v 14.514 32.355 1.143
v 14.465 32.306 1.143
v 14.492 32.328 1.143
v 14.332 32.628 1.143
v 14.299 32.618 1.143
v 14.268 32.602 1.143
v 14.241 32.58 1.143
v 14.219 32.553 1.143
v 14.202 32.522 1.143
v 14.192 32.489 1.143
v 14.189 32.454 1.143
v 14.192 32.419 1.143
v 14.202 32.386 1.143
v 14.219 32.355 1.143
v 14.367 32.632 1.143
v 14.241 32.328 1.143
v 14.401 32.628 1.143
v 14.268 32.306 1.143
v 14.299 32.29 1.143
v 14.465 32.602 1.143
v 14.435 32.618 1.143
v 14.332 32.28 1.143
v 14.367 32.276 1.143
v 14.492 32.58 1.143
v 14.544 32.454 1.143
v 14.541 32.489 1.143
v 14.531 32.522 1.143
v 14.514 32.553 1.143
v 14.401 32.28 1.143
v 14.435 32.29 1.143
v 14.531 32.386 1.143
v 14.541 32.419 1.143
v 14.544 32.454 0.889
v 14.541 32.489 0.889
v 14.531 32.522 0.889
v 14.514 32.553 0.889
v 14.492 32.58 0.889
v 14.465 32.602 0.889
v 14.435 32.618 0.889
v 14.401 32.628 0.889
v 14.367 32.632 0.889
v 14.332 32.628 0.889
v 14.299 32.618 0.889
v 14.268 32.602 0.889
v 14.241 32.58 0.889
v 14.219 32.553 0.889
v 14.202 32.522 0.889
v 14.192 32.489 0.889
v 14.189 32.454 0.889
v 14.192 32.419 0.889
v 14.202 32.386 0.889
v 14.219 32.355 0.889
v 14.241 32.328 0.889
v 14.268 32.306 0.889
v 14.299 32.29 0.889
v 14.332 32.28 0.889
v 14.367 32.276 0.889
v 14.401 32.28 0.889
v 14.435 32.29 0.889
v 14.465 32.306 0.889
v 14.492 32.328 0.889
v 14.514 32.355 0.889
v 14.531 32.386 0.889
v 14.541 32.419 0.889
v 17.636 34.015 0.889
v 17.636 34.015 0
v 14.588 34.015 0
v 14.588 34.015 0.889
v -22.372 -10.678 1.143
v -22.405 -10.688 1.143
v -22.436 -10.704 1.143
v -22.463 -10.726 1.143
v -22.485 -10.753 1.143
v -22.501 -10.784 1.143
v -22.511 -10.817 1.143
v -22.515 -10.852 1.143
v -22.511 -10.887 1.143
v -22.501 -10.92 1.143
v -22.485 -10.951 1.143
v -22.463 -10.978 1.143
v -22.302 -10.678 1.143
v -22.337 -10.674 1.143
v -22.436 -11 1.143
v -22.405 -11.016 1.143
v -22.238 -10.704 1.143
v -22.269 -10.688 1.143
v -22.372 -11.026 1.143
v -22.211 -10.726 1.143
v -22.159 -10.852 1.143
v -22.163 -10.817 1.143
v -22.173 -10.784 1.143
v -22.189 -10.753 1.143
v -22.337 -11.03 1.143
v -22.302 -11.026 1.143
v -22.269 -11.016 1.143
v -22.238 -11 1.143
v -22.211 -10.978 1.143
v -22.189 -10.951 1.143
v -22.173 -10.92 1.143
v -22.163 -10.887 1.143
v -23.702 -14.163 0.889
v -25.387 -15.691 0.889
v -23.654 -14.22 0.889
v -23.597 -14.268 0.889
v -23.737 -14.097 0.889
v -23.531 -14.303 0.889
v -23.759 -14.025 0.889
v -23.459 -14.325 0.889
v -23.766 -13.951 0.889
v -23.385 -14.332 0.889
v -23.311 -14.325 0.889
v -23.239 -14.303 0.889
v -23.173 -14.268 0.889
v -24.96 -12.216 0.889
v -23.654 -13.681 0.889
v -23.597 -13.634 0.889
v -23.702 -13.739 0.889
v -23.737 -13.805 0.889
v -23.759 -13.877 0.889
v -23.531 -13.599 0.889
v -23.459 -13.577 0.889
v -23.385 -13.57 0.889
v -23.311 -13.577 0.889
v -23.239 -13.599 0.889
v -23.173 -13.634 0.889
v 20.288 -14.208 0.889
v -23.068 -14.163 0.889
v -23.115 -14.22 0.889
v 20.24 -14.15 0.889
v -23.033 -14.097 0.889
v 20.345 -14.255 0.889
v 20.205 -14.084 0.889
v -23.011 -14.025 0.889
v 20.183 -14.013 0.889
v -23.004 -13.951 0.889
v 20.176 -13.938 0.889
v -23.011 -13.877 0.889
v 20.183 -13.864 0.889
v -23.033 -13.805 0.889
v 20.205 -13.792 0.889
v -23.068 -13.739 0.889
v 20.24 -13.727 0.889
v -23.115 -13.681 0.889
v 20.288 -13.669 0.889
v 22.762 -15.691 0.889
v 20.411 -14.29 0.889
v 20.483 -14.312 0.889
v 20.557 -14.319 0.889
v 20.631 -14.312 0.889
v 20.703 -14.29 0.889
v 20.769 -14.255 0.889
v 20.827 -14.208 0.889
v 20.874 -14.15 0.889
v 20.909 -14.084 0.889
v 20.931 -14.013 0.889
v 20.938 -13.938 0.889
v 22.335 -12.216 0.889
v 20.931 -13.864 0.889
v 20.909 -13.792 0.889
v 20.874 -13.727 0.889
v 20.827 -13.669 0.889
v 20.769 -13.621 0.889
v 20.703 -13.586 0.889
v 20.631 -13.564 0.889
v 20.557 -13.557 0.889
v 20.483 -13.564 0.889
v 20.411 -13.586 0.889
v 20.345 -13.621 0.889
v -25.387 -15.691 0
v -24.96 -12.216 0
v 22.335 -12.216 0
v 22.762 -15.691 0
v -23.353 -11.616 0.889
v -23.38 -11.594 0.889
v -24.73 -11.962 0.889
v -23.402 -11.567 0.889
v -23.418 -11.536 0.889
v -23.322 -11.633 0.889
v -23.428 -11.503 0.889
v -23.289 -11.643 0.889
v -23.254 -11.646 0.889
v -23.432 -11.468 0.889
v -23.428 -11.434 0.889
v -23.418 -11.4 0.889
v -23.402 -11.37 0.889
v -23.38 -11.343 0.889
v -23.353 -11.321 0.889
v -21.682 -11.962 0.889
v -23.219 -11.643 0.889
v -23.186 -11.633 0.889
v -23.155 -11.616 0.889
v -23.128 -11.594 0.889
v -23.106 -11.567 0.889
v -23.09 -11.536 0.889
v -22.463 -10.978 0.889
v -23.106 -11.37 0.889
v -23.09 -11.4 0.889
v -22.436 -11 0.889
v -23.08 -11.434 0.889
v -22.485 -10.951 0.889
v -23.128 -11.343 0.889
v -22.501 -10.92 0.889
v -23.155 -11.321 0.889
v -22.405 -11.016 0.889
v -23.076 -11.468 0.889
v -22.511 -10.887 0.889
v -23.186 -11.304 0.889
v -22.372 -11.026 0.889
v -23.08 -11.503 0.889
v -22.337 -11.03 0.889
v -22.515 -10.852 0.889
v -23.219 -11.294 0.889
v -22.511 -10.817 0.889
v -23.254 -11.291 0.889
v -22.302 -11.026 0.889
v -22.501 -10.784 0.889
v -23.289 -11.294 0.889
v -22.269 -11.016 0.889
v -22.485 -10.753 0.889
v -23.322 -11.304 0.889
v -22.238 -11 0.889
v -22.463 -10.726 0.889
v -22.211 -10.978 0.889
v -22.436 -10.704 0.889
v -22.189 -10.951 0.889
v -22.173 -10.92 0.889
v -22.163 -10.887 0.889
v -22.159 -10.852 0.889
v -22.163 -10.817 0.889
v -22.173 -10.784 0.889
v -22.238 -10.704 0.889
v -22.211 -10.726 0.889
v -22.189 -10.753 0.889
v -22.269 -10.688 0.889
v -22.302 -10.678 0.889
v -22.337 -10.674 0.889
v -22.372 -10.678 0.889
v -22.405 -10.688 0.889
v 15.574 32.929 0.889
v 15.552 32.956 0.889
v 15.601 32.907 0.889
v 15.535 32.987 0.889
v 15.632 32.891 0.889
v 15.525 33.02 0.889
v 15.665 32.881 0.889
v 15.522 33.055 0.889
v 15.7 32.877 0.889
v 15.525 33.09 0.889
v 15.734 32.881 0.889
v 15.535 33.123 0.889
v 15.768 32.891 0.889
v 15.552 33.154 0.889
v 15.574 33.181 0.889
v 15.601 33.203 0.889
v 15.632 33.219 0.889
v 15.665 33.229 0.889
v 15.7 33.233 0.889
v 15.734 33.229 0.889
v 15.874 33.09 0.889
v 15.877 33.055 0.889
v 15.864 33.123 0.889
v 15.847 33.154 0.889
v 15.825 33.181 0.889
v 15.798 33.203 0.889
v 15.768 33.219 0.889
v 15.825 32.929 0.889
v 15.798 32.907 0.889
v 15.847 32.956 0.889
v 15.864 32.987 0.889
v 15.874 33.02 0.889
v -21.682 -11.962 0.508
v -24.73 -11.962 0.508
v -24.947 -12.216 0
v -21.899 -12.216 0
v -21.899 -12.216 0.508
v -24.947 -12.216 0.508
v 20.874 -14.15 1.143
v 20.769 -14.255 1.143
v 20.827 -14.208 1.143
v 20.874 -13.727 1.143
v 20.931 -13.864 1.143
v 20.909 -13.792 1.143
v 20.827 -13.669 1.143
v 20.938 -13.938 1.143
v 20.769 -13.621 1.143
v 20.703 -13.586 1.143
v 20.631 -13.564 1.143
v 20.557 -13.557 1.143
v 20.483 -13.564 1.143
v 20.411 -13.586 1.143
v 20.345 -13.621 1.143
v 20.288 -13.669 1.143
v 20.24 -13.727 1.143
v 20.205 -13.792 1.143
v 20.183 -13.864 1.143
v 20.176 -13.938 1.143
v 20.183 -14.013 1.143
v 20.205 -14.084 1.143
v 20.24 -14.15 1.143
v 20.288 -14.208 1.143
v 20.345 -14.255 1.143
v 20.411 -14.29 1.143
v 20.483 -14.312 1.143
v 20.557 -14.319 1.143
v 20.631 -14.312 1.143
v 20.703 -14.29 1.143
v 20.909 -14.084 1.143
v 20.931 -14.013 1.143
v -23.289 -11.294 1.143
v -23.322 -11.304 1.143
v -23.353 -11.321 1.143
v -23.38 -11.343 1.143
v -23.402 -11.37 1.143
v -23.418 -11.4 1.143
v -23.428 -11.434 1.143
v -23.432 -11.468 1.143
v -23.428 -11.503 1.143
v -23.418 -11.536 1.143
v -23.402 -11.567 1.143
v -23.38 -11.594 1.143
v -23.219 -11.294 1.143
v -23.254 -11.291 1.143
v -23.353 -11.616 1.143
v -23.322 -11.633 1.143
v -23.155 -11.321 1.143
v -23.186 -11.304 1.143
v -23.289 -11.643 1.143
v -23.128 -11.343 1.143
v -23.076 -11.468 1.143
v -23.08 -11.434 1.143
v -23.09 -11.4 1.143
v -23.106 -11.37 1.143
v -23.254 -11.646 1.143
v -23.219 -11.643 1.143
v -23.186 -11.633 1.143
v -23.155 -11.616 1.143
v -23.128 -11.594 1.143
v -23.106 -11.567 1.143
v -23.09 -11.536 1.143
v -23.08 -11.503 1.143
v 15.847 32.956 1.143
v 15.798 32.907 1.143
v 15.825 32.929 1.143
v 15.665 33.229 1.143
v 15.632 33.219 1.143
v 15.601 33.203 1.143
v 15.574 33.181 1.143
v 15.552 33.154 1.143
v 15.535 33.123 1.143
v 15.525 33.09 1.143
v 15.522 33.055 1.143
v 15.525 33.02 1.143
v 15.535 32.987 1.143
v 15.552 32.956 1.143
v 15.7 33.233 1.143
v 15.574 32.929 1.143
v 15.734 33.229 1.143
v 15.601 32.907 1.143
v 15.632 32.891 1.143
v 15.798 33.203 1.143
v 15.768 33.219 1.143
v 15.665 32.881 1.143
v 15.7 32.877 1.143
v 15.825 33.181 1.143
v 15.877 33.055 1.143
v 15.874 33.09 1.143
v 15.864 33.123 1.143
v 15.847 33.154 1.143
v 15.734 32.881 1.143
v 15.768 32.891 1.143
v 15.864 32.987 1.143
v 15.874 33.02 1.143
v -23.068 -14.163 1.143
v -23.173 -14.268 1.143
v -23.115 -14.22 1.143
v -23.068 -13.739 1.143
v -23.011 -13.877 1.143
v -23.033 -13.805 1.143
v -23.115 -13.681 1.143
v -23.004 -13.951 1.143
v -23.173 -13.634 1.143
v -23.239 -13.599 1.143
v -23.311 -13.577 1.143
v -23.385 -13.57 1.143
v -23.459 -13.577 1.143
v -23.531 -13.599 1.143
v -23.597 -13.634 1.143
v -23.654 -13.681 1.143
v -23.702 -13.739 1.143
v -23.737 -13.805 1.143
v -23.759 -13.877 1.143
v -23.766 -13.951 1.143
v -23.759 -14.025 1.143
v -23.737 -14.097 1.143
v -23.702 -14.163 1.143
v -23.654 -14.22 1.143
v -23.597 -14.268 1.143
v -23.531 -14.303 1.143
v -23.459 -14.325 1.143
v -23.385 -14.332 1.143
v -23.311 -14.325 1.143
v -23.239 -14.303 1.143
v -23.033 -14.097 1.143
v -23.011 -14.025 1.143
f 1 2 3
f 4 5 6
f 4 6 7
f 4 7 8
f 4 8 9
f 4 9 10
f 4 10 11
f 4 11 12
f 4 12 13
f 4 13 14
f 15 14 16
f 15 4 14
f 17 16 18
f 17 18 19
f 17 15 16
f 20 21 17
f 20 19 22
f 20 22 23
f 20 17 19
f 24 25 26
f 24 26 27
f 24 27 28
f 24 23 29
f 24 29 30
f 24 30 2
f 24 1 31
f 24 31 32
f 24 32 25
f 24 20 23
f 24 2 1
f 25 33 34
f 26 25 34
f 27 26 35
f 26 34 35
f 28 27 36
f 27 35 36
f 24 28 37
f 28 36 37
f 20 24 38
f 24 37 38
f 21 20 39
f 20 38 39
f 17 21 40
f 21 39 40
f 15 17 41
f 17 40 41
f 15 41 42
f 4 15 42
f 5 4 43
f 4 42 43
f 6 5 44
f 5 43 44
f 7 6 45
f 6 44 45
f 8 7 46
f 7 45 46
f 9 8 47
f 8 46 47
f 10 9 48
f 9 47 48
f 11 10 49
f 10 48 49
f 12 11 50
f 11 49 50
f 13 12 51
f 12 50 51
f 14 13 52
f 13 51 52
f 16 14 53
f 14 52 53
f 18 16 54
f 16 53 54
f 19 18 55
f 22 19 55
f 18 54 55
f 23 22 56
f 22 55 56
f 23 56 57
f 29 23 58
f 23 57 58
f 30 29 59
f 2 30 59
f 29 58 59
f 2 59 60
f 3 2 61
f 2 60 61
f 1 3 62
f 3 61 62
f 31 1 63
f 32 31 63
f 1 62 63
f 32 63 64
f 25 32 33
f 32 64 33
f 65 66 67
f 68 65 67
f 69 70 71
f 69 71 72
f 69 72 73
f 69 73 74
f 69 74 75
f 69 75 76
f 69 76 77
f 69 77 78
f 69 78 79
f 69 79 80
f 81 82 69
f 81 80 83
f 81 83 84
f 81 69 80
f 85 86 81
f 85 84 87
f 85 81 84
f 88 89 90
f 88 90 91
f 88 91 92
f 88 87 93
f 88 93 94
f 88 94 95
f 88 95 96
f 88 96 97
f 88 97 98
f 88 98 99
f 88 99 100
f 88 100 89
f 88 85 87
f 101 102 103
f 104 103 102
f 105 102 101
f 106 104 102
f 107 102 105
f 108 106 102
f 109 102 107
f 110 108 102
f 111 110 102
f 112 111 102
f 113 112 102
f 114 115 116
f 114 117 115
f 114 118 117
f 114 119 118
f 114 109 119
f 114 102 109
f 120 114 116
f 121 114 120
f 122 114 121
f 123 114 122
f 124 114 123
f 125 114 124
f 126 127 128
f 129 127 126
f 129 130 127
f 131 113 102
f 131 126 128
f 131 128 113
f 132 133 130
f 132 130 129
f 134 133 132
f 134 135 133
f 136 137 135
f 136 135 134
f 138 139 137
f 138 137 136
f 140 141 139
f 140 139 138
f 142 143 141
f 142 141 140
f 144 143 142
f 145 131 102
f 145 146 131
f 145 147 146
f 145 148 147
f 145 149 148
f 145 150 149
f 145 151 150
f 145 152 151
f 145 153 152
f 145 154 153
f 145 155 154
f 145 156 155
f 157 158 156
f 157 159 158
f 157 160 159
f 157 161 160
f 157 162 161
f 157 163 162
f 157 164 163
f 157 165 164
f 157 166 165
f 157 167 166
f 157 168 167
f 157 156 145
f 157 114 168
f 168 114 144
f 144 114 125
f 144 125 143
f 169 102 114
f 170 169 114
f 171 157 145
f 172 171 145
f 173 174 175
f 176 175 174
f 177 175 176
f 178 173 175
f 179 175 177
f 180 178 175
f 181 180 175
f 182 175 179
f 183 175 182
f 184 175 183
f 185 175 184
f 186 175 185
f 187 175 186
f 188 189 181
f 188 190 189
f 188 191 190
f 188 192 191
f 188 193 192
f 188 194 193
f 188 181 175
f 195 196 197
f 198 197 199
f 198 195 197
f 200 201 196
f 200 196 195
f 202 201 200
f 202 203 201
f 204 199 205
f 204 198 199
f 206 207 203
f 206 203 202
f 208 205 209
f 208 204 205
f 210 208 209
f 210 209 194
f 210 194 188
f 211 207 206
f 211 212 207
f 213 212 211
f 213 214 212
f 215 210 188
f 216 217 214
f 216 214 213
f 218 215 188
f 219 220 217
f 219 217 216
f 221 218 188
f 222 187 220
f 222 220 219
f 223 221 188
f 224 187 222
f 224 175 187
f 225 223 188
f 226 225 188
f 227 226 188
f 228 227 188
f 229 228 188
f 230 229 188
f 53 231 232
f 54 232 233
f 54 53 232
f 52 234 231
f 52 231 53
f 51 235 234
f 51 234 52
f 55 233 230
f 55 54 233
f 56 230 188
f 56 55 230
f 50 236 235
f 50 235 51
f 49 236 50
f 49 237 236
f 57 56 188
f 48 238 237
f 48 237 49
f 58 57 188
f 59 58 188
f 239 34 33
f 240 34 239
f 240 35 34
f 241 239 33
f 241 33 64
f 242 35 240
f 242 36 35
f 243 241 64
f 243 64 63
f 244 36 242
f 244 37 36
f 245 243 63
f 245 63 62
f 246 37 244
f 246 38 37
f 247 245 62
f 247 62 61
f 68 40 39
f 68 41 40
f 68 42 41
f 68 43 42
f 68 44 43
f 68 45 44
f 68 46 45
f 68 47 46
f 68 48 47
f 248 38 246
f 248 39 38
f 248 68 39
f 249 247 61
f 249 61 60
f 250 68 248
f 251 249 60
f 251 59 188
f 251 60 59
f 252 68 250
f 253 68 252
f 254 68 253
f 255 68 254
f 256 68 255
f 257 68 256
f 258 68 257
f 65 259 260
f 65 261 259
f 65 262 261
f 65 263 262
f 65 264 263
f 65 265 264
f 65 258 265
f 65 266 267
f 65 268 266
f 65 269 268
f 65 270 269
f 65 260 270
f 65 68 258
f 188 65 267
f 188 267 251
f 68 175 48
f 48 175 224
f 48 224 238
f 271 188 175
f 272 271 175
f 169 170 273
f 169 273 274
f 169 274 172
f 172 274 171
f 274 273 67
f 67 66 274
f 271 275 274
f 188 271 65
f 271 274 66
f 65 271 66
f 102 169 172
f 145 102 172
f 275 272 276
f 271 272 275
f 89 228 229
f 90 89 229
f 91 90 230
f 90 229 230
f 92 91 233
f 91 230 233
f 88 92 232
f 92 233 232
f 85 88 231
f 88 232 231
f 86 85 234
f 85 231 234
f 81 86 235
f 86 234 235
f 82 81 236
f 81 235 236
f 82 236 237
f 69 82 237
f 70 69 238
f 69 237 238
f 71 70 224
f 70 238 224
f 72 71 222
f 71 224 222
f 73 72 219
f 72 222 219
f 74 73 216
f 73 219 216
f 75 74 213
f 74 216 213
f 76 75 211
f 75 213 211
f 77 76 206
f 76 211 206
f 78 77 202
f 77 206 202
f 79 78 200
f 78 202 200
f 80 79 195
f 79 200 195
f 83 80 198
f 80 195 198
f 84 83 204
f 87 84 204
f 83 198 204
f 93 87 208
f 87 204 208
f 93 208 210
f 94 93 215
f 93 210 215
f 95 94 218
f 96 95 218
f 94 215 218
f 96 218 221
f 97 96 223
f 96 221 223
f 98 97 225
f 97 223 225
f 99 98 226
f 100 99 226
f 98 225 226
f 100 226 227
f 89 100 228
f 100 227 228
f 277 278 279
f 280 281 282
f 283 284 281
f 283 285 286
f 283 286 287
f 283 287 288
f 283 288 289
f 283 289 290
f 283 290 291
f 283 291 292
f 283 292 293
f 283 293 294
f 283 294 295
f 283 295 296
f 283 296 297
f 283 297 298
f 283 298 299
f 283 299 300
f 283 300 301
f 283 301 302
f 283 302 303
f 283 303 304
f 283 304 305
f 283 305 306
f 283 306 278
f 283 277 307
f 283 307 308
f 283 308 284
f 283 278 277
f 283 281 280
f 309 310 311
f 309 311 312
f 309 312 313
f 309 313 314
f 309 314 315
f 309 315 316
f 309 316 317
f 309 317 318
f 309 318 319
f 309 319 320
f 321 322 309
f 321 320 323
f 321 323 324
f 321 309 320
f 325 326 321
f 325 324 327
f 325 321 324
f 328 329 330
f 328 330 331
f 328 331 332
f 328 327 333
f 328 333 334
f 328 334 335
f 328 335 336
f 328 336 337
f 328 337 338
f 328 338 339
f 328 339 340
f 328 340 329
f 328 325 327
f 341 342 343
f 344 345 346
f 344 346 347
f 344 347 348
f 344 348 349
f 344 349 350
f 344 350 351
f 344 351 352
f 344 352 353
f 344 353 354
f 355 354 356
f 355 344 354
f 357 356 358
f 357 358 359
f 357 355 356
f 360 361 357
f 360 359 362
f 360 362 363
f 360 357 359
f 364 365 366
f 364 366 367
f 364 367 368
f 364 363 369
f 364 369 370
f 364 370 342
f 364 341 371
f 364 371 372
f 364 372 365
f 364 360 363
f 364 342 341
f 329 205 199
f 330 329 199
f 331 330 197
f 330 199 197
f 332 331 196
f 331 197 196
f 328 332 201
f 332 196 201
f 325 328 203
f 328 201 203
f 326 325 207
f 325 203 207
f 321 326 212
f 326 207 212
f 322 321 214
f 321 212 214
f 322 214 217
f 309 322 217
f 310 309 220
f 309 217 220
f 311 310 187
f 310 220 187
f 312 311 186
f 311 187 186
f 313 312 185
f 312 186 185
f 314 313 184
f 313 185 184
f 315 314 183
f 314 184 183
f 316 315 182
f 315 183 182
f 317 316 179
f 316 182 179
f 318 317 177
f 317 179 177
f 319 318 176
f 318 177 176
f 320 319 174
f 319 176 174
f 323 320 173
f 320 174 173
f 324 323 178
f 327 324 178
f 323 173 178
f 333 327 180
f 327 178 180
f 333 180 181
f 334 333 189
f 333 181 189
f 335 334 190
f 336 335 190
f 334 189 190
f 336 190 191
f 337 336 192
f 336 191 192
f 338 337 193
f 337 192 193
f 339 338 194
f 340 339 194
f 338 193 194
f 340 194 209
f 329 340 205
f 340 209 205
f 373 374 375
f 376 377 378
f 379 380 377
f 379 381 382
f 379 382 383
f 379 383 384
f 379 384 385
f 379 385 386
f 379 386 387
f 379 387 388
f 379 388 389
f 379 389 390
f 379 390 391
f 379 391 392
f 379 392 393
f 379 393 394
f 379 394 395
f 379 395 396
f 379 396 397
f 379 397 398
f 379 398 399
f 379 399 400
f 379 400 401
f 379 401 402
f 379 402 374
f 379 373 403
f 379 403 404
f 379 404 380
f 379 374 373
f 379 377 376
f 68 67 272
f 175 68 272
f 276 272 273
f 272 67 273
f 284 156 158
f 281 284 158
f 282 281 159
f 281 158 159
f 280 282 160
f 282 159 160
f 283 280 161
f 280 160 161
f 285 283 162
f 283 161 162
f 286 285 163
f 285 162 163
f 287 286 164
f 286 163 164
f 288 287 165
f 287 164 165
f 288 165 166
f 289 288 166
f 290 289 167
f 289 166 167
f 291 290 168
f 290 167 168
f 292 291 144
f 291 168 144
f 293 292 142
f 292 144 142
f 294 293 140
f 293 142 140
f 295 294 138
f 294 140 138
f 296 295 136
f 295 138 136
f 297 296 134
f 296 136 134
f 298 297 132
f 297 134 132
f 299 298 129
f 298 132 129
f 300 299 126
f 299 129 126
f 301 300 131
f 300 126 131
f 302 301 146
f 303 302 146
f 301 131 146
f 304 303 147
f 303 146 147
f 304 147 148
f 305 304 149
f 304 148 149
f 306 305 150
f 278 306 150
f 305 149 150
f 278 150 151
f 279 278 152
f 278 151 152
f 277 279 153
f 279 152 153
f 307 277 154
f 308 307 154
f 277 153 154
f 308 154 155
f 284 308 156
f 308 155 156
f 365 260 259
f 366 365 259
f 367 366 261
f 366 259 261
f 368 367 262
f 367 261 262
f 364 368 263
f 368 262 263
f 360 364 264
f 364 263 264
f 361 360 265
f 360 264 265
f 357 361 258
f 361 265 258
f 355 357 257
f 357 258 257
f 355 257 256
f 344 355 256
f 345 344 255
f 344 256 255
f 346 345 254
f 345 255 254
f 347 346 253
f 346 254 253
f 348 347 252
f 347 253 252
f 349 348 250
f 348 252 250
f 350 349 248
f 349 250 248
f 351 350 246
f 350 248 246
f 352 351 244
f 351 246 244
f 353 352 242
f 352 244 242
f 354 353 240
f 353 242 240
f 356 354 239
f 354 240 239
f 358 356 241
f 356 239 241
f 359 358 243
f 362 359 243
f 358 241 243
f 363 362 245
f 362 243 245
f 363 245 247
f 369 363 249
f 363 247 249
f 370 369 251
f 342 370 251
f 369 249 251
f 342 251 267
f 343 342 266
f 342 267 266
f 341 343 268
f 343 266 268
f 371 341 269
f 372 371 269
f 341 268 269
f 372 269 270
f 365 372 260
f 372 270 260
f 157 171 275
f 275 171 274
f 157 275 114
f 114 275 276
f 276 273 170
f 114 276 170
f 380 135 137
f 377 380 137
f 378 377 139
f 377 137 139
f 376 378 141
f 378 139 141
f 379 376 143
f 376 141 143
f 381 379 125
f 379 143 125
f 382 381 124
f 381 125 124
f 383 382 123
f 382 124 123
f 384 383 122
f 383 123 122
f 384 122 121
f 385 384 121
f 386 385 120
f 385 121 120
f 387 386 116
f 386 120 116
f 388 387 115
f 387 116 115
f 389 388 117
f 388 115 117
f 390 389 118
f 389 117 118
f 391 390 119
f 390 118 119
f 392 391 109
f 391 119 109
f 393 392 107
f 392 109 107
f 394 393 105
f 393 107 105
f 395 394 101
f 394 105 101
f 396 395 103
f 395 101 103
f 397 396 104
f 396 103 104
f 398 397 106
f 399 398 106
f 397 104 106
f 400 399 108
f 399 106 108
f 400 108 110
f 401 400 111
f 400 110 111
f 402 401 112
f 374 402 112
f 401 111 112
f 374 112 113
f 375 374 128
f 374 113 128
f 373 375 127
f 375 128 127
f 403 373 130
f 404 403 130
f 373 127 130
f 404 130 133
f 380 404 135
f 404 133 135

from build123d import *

# Parameters (mm, degrees)
F1_DEPTH = 0.889
F3_DEPTH = 0.381
F4_R     = 0.1778
F4_R_2   = 0.381
F5_DEPTH = 0.254
F7_DEPTH = 25.4


with BuildPart() as f1:
    # F0 (on Top) → F1 (new body)
    with BuildSketch(Plane.XY):
        Polygon((-24.947381, -12.216053), (-26.81388, -12.216053), (-26.81388, -15.690773), (23.98612, -15.690773), (23.98612, -12.216053), (-21.899363, -12.216053), (17.63612, 34.014853), (14.588101, 34.014853), align=None)
    extrude(amount=F1_DEPTH)

    # F2 (on face) → F3 (cut)
    with BuildSketch(Plane.XY.offset(0.889)):
        Polygon((-24.730167, -11.962053), (-24.947381, -12.216053), (-21.899363, -12.216053), (-21.682148, -11.962053), align=None)
    extrude(amount=-F3_DEPTH, mode=Mode.SUBTRACT)

    # F4 (on face) → F5 (join)
    with BuildSketch(Plane.XY.offset(0.889)):
        with Locations((-23.253968, -11.468455)):
            Circle(F4_R)
        with Locations((-22.337059, -10.852045)):
            Circle(F4_R)
        with Locations((-23.38488, -13.950873)):
            Circle(F4_R_2)
        with Locations((15.699644, 33.05497)):
            Circle(F4_R)
        with Locations((14.366657, 32.453973)):
            Circle(F4_R)
        with Locations((20.55712, -13.938173)):
            Circle(F4_R_2)
    extrude(amount=F5_DEPTH)

    # F6 (on face) → F7 (cut)
    with BuildSketch(Plane.XY.offset(0.889)):
        Polygon((-25.387098, -15.690773), (-24.960456, -12.216053), (-26.81388, -12.216053), (-26.81388, -15.690773), align=None)
        Polygon((22.33512, -12.216053), (22.761762, -15.690773), (23.98612, -15.690773), (23.98612, -12.216053), align=None)
    extrude(amount=-F7_DEPTH, mode=Mode.SUBTRACT)


solid = f1.part
